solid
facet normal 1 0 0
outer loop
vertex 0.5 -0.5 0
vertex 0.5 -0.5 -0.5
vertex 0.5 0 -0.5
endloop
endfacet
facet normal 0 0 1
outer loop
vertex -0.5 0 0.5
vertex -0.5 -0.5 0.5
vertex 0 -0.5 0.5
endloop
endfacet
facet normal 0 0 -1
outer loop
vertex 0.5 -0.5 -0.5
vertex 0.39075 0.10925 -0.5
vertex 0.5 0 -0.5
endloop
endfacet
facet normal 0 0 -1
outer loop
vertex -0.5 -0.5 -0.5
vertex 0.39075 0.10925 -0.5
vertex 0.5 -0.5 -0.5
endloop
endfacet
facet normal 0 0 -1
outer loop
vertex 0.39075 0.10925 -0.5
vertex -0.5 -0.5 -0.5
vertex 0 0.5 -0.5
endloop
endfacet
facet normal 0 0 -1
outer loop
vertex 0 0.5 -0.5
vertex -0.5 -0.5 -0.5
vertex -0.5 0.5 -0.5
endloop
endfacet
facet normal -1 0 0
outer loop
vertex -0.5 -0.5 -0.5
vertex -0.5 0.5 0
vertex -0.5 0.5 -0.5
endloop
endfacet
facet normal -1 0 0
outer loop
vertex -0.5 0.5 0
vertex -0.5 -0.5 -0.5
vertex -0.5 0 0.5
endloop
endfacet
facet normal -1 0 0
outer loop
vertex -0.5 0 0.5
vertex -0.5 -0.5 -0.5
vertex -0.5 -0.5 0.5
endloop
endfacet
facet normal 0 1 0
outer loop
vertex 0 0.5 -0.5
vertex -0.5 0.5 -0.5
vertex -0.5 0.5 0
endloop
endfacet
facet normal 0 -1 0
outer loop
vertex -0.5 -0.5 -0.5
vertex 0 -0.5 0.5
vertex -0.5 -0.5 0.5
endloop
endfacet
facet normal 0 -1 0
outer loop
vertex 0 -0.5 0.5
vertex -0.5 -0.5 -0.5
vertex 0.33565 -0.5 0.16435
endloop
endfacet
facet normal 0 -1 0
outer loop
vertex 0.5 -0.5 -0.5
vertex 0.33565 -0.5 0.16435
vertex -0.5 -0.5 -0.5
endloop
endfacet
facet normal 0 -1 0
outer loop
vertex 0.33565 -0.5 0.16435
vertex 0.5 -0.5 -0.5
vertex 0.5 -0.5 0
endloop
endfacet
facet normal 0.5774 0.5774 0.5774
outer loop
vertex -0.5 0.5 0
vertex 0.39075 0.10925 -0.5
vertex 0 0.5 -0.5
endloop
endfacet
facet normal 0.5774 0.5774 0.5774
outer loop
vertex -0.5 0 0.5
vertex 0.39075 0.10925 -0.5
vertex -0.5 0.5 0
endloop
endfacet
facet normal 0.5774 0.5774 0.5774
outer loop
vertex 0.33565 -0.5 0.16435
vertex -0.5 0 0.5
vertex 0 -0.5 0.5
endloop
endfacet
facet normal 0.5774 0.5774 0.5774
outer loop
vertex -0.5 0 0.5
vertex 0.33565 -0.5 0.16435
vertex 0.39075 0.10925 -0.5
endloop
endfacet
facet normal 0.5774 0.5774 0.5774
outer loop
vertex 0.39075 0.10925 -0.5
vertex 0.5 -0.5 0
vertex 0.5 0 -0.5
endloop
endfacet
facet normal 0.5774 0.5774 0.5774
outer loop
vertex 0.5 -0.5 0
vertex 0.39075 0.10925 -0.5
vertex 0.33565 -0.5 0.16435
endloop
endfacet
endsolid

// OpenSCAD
angulo_magico=acos(sqrt(3)/3);
%cube(1,center=true);
difference()
{
    
    cube(1,center=true);
angulo_magico=acos(sqrt(3)/3);
//rotate([90-angulo_magico,90-angulo_magico,0])
rotate(a=0, v=[1,1,1])
rotate([-angulo_magico,0,-45]) translate ([0,0,sqrt(3)/2/**2*$t*/])
cylinder(r=2,h=sqrt(3),center=true);
    
}

//Lista de vertices
/*
4 vertices 90-90-90
3 vertices 45-135-45-135|180,120
3 vertices 45-135-45-135|120,180
*/
